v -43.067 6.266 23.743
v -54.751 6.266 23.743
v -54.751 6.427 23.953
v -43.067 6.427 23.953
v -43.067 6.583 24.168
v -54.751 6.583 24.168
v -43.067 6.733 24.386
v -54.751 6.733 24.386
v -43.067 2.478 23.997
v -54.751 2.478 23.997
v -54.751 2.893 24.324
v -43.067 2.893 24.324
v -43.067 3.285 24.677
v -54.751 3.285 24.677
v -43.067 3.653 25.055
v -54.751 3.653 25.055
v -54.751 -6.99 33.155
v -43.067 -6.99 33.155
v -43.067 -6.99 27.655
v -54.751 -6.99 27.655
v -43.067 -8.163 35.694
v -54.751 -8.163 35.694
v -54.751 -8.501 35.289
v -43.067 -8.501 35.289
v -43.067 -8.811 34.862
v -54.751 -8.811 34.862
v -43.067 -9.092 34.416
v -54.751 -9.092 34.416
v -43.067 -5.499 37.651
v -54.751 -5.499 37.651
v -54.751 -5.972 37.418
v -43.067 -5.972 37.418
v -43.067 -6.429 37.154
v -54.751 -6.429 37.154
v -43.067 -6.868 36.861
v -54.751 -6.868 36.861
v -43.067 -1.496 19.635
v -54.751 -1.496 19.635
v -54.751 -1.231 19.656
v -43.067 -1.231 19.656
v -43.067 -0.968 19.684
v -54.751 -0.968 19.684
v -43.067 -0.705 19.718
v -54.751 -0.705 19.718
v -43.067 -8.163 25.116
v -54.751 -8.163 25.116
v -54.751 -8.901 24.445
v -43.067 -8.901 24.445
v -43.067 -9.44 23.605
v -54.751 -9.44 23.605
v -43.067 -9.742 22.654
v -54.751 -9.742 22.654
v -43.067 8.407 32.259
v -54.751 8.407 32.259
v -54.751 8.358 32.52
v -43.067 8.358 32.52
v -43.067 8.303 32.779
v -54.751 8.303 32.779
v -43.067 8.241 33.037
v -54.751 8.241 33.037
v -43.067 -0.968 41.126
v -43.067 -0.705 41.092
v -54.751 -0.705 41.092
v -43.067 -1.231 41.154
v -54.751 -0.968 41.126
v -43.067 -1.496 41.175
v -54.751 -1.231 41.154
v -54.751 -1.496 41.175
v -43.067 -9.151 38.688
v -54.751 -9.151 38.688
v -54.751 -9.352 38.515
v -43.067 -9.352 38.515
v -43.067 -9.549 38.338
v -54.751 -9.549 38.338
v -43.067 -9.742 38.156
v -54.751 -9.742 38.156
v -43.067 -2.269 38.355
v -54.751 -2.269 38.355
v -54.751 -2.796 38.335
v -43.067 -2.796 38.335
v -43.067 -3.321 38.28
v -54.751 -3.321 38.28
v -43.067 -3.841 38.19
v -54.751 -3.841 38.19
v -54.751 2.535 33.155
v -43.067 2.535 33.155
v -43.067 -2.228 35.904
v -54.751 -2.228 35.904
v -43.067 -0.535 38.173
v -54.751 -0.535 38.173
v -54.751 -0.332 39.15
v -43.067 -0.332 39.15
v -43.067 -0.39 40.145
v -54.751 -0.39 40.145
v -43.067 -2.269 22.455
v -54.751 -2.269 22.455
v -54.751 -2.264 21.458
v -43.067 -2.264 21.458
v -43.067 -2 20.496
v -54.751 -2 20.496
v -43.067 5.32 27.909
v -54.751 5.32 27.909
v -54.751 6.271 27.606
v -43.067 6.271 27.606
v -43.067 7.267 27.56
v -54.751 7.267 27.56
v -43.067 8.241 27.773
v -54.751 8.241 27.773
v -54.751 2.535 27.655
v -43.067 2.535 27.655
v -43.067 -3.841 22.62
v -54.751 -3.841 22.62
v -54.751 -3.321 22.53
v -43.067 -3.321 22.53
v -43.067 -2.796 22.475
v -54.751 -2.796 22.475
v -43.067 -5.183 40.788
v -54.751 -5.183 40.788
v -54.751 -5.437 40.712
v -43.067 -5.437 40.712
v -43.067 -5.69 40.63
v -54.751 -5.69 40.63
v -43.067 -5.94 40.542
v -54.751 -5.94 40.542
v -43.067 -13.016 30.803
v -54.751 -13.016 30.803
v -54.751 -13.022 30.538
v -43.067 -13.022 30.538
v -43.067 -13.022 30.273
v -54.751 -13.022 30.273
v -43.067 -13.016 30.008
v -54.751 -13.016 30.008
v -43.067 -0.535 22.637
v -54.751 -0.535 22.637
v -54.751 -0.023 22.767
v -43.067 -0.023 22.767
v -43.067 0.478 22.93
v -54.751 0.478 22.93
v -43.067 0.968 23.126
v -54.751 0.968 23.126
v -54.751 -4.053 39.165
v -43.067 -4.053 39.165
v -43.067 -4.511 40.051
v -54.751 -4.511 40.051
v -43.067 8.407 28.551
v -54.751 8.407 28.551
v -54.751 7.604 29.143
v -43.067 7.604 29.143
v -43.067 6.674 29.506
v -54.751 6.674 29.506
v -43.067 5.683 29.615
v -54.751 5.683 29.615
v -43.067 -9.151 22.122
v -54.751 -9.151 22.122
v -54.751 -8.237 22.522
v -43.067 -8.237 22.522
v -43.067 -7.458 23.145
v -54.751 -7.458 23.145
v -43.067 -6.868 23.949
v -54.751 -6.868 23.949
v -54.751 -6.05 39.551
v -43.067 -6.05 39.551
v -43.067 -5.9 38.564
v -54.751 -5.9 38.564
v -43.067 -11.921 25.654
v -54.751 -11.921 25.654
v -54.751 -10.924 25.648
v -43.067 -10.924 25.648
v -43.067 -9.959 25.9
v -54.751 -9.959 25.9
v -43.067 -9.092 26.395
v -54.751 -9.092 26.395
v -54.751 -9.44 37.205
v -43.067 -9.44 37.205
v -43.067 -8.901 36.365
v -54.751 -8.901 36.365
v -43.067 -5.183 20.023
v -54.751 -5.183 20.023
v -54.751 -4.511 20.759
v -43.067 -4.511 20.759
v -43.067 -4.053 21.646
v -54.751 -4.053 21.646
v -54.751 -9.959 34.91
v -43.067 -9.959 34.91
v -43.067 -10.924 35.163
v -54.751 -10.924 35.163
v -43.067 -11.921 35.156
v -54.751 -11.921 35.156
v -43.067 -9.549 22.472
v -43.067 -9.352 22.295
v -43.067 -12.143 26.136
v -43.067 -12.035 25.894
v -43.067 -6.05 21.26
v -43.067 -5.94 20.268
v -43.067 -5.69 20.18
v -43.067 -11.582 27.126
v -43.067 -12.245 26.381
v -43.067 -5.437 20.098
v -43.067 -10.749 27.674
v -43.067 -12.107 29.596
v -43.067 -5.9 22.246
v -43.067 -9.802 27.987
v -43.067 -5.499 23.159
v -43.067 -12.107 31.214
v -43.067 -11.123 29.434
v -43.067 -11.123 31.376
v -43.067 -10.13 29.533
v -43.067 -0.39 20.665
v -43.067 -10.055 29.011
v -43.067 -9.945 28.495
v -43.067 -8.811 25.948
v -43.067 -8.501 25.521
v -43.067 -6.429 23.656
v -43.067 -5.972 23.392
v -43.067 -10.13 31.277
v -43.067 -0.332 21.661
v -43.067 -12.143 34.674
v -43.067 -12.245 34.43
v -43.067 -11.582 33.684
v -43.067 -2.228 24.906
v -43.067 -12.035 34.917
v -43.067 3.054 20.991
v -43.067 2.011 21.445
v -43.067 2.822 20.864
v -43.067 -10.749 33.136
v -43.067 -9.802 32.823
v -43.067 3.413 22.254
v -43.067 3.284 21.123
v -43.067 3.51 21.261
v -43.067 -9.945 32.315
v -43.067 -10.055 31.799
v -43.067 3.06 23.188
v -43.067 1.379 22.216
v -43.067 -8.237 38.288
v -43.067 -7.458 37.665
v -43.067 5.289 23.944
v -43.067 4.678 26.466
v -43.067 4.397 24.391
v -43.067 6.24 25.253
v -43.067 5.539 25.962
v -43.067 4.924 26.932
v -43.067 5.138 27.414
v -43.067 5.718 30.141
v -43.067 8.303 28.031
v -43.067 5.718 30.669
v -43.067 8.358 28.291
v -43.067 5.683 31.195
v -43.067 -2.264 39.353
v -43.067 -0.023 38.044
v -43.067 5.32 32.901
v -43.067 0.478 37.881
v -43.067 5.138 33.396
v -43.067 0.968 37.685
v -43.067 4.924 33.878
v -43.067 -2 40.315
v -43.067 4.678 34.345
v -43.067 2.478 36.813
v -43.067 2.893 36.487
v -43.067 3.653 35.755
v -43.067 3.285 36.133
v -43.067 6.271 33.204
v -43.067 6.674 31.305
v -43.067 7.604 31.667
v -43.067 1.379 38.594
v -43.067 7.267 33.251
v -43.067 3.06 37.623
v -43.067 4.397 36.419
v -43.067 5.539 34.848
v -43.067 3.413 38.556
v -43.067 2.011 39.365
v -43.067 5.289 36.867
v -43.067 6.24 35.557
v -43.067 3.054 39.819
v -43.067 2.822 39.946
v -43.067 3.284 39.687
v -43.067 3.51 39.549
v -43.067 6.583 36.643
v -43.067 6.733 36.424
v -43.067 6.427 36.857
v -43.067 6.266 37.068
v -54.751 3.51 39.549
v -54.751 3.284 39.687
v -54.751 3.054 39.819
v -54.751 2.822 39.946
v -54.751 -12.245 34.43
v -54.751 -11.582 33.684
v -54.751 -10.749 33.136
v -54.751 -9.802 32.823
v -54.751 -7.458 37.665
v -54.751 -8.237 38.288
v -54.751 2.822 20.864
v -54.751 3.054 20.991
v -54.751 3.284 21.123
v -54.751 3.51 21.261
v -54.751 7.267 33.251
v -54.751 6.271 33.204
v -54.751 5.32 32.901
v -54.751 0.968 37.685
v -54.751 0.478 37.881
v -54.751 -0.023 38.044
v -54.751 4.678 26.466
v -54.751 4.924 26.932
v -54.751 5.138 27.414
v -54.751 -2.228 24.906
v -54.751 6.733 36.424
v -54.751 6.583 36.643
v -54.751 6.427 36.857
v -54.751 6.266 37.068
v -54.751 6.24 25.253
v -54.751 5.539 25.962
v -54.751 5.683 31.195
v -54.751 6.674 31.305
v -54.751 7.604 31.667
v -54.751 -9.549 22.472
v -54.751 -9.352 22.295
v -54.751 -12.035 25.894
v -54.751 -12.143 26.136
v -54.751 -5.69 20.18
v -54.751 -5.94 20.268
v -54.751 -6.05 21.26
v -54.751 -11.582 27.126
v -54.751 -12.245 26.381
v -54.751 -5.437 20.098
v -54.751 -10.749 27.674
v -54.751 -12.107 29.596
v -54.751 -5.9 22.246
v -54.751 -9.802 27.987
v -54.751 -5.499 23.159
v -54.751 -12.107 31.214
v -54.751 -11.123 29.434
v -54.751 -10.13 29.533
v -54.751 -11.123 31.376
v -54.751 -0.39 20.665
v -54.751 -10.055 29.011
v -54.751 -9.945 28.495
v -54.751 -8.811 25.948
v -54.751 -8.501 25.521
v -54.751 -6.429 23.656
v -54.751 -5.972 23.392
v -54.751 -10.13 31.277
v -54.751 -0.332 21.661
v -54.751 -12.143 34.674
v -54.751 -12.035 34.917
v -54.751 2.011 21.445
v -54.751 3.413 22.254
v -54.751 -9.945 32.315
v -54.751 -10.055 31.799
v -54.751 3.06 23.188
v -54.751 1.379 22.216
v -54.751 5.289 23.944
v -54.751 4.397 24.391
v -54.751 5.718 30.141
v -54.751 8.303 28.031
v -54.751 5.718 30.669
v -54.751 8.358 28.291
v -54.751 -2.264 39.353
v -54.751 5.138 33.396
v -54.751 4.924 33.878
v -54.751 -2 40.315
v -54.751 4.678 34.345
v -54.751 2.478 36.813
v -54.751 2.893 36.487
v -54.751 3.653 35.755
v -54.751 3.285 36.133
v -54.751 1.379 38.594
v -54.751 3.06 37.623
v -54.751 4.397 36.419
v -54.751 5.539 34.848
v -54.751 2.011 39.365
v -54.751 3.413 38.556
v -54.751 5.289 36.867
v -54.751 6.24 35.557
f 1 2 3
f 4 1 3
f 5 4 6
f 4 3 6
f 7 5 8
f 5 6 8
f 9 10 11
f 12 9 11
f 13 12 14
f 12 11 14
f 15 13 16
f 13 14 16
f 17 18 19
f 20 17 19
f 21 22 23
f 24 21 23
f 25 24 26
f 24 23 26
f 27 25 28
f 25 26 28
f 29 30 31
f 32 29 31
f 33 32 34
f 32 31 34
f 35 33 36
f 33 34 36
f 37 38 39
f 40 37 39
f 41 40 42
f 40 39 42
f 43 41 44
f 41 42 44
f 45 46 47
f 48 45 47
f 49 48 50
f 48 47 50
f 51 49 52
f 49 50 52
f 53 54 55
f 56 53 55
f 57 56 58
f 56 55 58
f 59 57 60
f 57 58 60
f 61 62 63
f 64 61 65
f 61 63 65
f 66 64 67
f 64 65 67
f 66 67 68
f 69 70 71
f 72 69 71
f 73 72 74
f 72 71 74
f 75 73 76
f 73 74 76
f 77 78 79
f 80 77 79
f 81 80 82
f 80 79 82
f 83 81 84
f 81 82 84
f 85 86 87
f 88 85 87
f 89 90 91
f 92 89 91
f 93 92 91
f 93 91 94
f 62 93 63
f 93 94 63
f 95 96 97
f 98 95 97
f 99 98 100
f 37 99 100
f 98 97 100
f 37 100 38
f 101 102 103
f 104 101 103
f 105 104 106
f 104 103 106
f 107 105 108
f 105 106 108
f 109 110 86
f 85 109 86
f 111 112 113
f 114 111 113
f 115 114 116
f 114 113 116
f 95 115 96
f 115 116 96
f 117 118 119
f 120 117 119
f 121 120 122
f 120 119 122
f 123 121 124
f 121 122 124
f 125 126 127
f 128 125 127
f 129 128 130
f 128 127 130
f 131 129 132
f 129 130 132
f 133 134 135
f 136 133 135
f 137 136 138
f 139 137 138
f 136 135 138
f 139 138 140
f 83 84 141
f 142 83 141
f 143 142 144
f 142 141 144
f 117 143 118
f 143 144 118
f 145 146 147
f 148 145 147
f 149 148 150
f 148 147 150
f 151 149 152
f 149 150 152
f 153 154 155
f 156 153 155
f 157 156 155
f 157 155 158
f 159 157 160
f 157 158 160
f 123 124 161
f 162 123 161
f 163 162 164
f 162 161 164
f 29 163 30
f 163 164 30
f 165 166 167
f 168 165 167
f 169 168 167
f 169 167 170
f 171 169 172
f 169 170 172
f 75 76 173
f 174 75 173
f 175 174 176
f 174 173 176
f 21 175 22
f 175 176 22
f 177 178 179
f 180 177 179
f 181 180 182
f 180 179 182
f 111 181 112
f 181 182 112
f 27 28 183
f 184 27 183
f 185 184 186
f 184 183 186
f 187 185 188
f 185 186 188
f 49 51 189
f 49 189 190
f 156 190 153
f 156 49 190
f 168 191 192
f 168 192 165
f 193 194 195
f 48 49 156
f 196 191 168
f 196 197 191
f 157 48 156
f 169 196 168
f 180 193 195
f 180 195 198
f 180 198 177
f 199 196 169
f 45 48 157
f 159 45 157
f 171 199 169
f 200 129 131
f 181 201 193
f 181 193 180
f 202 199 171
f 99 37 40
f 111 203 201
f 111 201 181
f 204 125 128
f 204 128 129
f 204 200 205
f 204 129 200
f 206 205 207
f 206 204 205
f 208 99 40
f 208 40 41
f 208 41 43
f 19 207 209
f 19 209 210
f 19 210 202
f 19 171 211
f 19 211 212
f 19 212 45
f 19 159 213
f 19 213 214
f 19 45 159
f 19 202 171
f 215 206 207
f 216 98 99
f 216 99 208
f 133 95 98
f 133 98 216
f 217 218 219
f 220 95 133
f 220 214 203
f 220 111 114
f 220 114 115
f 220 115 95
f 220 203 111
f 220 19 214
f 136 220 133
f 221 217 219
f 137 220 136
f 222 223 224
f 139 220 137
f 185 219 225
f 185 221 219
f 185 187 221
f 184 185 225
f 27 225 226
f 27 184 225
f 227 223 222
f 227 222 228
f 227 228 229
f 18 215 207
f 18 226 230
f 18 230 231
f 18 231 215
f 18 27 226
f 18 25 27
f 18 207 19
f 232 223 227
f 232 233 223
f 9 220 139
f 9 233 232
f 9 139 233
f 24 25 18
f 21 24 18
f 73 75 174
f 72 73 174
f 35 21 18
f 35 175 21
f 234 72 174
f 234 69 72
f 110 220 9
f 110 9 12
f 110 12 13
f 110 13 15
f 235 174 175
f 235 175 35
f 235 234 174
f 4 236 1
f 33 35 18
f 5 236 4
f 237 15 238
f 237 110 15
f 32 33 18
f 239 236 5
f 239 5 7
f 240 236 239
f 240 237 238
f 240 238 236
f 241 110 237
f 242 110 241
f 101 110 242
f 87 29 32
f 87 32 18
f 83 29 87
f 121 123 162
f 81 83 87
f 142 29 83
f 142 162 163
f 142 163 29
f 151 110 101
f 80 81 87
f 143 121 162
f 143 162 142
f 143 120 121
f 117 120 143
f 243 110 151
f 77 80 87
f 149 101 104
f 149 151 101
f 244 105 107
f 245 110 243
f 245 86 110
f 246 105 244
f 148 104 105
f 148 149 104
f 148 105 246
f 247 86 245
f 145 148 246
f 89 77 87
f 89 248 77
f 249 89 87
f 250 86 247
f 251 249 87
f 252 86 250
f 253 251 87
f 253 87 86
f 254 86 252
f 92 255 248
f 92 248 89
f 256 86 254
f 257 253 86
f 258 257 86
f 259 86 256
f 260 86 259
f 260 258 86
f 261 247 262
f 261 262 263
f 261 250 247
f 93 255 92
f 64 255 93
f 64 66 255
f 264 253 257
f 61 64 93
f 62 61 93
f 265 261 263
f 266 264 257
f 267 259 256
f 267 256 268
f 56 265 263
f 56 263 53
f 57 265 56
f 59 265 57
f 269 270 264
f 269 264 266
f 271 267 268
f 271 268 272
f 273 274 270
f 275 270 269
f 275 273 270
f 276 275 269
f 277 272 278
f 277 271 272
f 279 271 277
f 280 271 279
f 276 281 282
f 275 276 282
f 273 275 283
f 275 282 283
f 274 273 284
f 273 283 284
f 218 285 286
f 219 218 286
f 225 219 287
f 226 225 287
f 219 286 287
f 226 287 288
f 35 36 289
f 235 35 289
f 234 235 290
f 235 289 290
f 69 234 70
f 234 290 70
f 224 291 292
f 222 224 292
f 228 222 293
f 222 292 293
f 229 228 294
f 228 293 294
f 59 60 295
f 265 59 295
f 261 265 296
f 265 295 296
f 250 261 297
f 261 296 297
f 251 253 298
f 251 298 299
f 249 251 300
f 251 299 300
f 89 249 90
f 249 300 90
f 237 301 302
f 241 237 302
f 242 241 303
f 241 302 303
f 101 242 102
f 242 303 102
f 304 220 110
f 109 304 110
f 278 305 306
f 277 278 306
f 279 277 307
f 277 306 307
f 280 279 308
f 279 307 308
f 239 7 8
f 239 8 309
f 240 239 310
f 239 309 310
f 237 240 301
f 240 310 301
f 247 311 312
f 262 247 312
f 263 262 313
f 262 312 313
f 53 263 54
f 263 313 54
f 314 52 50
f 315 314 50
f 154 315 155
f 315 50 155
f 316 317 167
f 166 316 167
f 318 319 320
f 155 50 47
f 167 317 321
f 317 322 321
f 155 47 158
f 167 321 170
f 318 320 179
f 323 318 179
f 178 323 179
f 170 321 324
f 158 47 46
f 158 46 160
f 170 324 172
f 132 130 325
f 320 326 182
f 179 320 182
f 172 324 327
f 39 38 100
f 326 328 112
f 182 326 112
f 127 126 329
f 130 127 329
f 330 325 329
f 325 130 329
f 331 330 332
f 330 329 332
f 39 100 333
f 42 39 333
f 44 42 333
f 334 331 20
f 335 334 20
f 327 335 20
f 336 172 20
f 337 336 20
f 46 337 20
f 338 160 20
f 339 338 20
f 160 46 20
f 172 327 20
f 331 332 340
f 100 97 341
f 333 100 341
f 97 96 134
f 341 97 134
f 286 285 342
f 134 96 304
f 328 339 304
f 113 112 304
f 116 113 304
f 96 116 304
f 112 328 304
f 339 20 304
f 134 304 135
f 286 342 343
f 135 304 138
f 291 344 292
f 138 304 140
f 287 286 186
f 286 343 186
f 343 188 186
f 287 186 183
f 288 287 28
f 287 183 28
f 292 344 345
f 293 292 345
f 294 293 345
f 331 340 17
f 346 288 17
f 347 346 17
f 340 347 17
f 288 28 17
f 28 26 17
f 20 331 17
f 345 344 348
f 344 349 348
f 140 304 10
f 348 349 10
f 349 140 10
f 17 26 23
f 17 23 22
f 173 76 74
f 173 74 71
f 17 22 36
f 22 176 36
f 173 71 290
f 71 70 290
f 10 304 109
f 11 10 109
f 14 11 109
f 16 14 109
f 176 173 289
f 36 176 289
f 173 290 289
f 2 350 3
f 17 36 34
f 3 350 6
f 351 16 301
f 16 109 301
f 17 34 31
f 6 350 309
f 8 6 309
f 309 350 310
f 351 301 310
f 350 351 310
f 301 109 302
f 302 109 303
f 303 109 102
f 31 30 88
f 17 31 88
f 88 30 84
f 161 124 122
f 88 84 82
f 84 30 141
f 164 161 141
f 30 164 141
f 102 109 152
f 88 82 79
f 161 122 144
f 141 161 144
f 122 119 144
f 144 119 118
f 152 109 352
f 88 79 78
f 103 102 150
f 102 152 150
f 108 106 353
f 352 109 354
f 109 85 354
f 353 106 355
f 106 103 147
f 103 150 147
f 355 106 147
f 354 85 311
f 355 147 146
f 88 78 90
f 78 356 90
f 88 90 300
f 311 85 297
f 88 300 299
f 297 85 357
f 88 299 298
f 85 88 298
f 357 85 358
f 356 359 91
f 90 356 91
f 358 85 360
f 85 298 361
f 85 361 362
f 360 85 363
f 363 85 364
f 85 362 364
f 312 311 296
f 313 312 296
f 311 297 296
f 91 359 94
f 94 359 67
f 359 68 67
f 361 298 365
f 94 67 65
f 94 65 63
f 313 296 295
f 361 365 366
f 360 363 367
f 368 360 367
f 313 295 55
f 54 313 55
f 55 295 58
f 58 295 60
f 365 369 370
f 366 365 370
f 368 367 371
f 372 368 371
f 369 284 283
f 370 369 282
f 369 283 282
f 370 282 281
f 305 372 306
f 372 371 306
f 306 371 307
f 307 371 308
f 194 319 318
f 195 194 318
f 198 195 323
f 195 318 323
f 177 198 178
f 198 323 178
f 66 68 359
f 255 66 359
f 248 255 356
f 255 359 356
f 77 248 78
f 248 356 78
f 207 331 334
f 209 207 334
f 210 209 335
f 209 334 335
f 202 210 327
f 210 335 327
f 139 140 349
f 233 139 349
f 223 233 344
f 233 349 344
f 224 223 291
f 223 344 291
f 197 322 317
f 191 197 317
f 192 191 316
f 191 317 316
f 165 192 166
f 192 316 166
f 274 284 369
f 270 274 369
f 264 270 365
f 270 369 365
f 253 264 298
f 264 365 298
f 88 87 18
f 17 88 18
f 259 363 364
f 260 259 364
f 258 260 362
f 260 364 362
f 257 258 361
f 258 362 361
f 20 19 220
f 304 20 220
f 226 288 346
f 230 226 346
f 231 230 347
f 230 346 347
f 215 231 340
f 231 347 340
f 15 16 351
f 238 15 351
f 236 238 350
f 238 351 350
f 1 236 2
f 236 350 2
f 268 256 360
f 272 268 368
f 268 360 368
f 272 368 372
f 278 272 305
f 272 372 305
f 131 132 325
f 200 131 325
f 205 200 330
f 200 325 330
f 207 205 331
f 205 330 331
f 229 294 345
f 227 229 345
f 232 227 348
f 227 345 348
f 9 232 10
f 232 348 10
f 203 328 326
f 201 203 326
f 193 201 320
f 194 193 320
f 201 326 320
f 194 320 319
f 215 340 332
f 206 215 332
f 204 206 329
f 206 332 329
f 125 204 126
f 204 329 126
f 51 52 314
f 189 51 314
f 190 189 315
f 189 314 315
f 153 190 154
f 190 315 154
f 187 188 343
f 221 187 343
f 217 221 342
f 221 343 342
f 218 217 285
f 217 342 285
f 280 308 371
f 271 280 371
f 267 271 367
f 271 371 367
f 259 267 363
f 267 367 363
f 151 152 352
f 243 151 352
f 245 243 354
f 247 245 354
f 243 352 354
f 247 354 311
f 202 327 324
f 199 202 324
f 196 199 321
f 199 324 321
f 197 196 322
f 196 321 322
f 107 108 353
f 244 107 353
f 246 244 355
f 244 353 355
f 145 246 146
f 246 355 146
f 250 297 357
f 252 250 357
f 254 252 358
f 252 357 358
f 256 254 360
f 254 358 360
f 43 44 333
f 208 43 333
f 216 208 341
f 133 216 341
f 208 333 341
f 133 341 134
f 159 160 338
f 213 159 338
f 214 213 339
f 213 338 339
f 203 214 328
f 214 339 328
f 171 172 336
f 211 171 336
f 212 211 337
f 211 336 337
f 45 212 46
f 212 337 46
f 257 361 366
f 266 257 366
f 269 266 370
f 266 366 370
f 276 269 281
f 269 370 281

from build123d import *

# Parameters (mm, degrees)
SPUR_START             = -54.751290346
SPUR_GEAR_AI_OUTLINE_R = 4.7625
SPUR_GEAR_AI_DEPTH     = 11.684
CUT_EXTRUDE1_DEPTH     = 45.73825268


# Read off the part's stored shape, not the designer's step: spur gear_ai
with BuildPart() as part:
    # spur gear_ai outline → spur gear_ai (new body)
    with BuildSketch(Plane.YZ.offset(SPUR_START)):
        with BuildLine():
            ThreePointArc((6.265843754, 23.742611923), (6.505460201, 24.059955507), (6.73322633, 24.385908852))
            ThreePointArc((6.73322633, 24.385908852), (5.912883536, 25.630805773), (4.677624003, 26.465589895))
            ThreePointArc((4.677624003, 26.465589895), (5.034990844, 27.171459646), (5.320429206, 27.90935402))
            ThreePointArc((5.320429206, 27.90935402), (6.767344667, 27.549956895), (8.241399844, 27.773322024))
            ThreePointArc((8.241399844, 27.773322024), (8.331225097, 28.160690604), (8.40672264, 28.551104632))
            ThreePointArc((8.40672264, 28.551104632), (7.150957012, 29.354711085), (5.682953985, 29.614899012))
            ThreePointArc((5.682953985, 29.614899012), (5.722321747, 30.405097306), (5.682953985, 31.1952956))
            ThreePointArc((5.682953985, 31.1952956), (7.150957012, 31.455483527), (8.40672264, 32.25908998))
            ThreePointArc((8.40672264, 32.25908998), (8.331225097, 32.649504008), (8.241399844, 33.036872588))
            ThreePointArc((8.241399844, 33.036872588), (6.767344667, 33.260237716), (5.320429206, 32.900840592))
            ThreePointArc((5.320429206, 32.900840592), (5.034990844, 33.638734965), (4.677624003, 34.344604716))
            ThreePointArc((4.677624003, 34.344604716), (5.912883536, 35.179388839), (6.73322633, 36.42428576))
            ThreePointArc((6.73322633, 36.42428576), (6.505460201, 36.750239104), (6.265843754, 37.067582688))
            ThreePointArc((6.265843754, 37.067582688), (4.82837656, 36.672084633), (3.652733492, 35.755245485))
            ThreePointArc((3.652733492, 35.755245485), (3.091843894, 36.313247297), (2.478269946, 36.812737212))
            ThreePointArc((2.478269946, 36.812737212), (3.26719839, 38.077775771), (3.510273629, 39.548709173))
            ThreePointArc((3.510273629, 39.548709173), (3.169621747, 39.75384154), (2.821645965, 39.94628854))
            ThreePointArc((2.821645965, 39.94628854), (1.669317892, 39.000312507), (0.968226585, 37.684561153))
            ThreePointArc((0.968226585, 37.684561153), (0.228868656, 37.966186822), (-0.534819889, 38.172930557))
            ThreePointArc((-0.534819889, 38.172930557), (-0.328635429, 39.649486893), (-0.704857663, 41.092119028))
            ThreePointArc((-0.704857663, 41.092119028), (-1.099493493, 41.140961166), (-1.495660434, 41.175235748))
            ThreePointArc((-1.495660434, 41.175235748), (-2.163601395, 39.842349587), (-2.268915885, 38.35519139))
            ThreePointArc((-2.268915885, 38.35519139), (-3.058900442, 38.311745278), (-3.840654895, 38.189994964))
            ThreePointArc((-3.840654895, 38.189994964), (-4.252865586, 39.622759072), (-5.18333305, 40.787645738))
            ThreePointArc((-5.18333305, 40.787645738), (-5.563716707, 40.671752399), (-5.939573945, 40.541928176))
            ThreePointArc((-5.939573945, 40.541928176), (-6.007634734, 39.052600014), (-5.498962575, 37.651178136))
            ThreePointArc((-5.498962575, 37.651178136), (-6.202978253, 37.290172471), (-6.867626169, 36.860979842))
            ThreePointArc((-6.867626169, 36.860979842), (-7.826957037, 38.002213793), (-9.150783454, 38.687935502))
            ThreePointArc((-9.150783454, 38.687935502), (-9.451143149, 38.427345697), (-9.741701553, 38.155870456))
            ThreePointArc((-9.741701553, 38.155870456), (-9.19811384, 36.767618662), (-8.16340907, 35.694251677))
            ThreePointArc((-8.16340907, 35.694251677), (-8.659725162, 35.078107619), (-9.092342877, 34.41568398))
            ThreePointArc((-9.092342877, 34.41568398), (-10.4329169, 35.068058055), (-11.921200656, 35.156047294))
            ThreePointArc((-11.921200656, 35.156047294), (-12.089601468, 34.795819368), (-12.24462085, 34.429633645))
            ThreePointArc((-12.24462085, 34.429633645), (-11.18337589, 33.382499566), (-9.801548363, 32.822782378))
            ThreePointArc((-9.801548363, 32.822782378), (-10.004347308, 32.05803683), (-10.13013129, 31.276921247))
            ThreePointArc((-10.13013129, 31.276921247), (-11.62015104, 31.327634041), (-13.015554353, 30.802676673))
            ThreePointArc((-13.015554353, 30.802676673), (-13.022878253, 30.405097306), (-13.015554353, 30.007517939))
            ThreePointArc((-13.015554353, 30.007517939), (-11.62015104, 29.48256057), (-10.13013129, 29.533273365))
            ThreePointArc((-10.13013129, 29.533273365), (-10.004347308, 28.752157782), (-9.801548363, 27.987412234))
            ThreePointArc((-9.801548363, 27.987412234), (-11.18337589, 27.427695046), (-12.24462085, 26.380560967))
            ThreePointArc((-12.24462085, 26.380560967), (-12.089601468, 26.014375244), (-11.921200656, 25.654147317))
            ThreePointArc((-11.921200656, 25.654147317), (-10.4329169, 25.742136557), (-9.092342877, 26.394510632))
            ThreePointArc((-9.092342877, 26.394510632), (-8.659725162, 25.732086993), (-8.16340907, 25.115942934))
            ThreePointArc((-8.16340907, 25.115942934), (-9.19811384, 24.04257595), (-9.741701553, 22.654324156))
            ThreePointArc((-9.741701553, 22.654324156), (-9.451143149, 22.382848915), (-9.150783454, 22.12225911))
            ThreePointArc((-9.150783454, 22.12225911), (-7.826957037, 22.807980819), (-6.867626169, 23.94921477))
            ThreePointArc((-6.867626169, 23.94921477), (-6.202978253, 23.520022141), (-5.498962575, 23.159016476))
            ThreePointArc((-5.498962575, 23.159016476), (-6.007634734, 21.757594598), (-5.939573945, 20.268266436))
            ThreePointArc((-5.939573945, 20.268266436), (-5.563716707, 20.138442212), (-5.18333305, 20.022548874))
            ThreePointArc((-5.18333305, 20.022548874), (-4.252865586, 21.187435539), (-3.840654895, 22.620199648))
            ThreePointArc((-3.840654895, 22.620199648), (-3.058900442, 22.498449333), (-2.268915885, 22.455003221))
            ThreePointArc((-2.268915885, 22.455003221), (-2.163601395, 20.967845024), (-1.495660434, 19.634958864))
            ThreePointArc((-1.495660434, 19.634958864), (-1.099493492, 19.669233445), (-0.704857663, 19.718075584))
            ThreePointArc((-0.704857663, 19.718075584), (-0.328635429, 21.160707719), (-0.534819889, 22.637264055))
            ThreePointArc((-0.534819889, 22.637264055), (0.228868655, 22.84400779), (0.968226585, 23.125633458))
            ThreePointArc((0.968226585, 23.125633458), (1.669317892, 21.809882105), (2.821645965, 20.863906072))
            ThreePointArc((2.821645965, 20.863906072), (3.169621747, 21.056353072), (3.510273629, 21.261485438))
            ThreePointArc((3.510273629, 21.261485438), (3.26719839, 22.73241884), (2.478269946, 23.997457399))
            ThreePointArc((2.478269946, 23.997457399), (3.091843894, 24.496947314), (3.652733492, 25.054949127))
            ThreePointArc((3.652733492, 25.054949127), (4.82837656, 24.138109979), (6.265843754, 23.742611923))
        make_face()
        with Locations((-2.227878253, 30.405097306)):
            Circle(SPUR_GEAR_AI_OUTLINE_R, mode=Mode.SUBTRACT)
    extrude(amount=SPUR_GEAR_AI_DEPTH)

    # Sketch1 → Cut-Extrude1 (cut, through all)
    with BuildSketch(Plane(origin=(-43.067290346, 0, 0), x_dir=(0, 0, -1), z_dir=(1, 0, 0))):
        Polygon((-27.655466649, 2.534621747), (-33.154727963, 2.534621747), (-35.90435862, -2.227878253), (-33.154727963, -6.990378253), (-27.655466649, -6.990378253), (-24.905835992, -2.227878253), align=None)
    extrude(amount=-CUT_EXTRUDE1_DEPTH, mode=Mode.SUBTRACT)


solid = part.part
